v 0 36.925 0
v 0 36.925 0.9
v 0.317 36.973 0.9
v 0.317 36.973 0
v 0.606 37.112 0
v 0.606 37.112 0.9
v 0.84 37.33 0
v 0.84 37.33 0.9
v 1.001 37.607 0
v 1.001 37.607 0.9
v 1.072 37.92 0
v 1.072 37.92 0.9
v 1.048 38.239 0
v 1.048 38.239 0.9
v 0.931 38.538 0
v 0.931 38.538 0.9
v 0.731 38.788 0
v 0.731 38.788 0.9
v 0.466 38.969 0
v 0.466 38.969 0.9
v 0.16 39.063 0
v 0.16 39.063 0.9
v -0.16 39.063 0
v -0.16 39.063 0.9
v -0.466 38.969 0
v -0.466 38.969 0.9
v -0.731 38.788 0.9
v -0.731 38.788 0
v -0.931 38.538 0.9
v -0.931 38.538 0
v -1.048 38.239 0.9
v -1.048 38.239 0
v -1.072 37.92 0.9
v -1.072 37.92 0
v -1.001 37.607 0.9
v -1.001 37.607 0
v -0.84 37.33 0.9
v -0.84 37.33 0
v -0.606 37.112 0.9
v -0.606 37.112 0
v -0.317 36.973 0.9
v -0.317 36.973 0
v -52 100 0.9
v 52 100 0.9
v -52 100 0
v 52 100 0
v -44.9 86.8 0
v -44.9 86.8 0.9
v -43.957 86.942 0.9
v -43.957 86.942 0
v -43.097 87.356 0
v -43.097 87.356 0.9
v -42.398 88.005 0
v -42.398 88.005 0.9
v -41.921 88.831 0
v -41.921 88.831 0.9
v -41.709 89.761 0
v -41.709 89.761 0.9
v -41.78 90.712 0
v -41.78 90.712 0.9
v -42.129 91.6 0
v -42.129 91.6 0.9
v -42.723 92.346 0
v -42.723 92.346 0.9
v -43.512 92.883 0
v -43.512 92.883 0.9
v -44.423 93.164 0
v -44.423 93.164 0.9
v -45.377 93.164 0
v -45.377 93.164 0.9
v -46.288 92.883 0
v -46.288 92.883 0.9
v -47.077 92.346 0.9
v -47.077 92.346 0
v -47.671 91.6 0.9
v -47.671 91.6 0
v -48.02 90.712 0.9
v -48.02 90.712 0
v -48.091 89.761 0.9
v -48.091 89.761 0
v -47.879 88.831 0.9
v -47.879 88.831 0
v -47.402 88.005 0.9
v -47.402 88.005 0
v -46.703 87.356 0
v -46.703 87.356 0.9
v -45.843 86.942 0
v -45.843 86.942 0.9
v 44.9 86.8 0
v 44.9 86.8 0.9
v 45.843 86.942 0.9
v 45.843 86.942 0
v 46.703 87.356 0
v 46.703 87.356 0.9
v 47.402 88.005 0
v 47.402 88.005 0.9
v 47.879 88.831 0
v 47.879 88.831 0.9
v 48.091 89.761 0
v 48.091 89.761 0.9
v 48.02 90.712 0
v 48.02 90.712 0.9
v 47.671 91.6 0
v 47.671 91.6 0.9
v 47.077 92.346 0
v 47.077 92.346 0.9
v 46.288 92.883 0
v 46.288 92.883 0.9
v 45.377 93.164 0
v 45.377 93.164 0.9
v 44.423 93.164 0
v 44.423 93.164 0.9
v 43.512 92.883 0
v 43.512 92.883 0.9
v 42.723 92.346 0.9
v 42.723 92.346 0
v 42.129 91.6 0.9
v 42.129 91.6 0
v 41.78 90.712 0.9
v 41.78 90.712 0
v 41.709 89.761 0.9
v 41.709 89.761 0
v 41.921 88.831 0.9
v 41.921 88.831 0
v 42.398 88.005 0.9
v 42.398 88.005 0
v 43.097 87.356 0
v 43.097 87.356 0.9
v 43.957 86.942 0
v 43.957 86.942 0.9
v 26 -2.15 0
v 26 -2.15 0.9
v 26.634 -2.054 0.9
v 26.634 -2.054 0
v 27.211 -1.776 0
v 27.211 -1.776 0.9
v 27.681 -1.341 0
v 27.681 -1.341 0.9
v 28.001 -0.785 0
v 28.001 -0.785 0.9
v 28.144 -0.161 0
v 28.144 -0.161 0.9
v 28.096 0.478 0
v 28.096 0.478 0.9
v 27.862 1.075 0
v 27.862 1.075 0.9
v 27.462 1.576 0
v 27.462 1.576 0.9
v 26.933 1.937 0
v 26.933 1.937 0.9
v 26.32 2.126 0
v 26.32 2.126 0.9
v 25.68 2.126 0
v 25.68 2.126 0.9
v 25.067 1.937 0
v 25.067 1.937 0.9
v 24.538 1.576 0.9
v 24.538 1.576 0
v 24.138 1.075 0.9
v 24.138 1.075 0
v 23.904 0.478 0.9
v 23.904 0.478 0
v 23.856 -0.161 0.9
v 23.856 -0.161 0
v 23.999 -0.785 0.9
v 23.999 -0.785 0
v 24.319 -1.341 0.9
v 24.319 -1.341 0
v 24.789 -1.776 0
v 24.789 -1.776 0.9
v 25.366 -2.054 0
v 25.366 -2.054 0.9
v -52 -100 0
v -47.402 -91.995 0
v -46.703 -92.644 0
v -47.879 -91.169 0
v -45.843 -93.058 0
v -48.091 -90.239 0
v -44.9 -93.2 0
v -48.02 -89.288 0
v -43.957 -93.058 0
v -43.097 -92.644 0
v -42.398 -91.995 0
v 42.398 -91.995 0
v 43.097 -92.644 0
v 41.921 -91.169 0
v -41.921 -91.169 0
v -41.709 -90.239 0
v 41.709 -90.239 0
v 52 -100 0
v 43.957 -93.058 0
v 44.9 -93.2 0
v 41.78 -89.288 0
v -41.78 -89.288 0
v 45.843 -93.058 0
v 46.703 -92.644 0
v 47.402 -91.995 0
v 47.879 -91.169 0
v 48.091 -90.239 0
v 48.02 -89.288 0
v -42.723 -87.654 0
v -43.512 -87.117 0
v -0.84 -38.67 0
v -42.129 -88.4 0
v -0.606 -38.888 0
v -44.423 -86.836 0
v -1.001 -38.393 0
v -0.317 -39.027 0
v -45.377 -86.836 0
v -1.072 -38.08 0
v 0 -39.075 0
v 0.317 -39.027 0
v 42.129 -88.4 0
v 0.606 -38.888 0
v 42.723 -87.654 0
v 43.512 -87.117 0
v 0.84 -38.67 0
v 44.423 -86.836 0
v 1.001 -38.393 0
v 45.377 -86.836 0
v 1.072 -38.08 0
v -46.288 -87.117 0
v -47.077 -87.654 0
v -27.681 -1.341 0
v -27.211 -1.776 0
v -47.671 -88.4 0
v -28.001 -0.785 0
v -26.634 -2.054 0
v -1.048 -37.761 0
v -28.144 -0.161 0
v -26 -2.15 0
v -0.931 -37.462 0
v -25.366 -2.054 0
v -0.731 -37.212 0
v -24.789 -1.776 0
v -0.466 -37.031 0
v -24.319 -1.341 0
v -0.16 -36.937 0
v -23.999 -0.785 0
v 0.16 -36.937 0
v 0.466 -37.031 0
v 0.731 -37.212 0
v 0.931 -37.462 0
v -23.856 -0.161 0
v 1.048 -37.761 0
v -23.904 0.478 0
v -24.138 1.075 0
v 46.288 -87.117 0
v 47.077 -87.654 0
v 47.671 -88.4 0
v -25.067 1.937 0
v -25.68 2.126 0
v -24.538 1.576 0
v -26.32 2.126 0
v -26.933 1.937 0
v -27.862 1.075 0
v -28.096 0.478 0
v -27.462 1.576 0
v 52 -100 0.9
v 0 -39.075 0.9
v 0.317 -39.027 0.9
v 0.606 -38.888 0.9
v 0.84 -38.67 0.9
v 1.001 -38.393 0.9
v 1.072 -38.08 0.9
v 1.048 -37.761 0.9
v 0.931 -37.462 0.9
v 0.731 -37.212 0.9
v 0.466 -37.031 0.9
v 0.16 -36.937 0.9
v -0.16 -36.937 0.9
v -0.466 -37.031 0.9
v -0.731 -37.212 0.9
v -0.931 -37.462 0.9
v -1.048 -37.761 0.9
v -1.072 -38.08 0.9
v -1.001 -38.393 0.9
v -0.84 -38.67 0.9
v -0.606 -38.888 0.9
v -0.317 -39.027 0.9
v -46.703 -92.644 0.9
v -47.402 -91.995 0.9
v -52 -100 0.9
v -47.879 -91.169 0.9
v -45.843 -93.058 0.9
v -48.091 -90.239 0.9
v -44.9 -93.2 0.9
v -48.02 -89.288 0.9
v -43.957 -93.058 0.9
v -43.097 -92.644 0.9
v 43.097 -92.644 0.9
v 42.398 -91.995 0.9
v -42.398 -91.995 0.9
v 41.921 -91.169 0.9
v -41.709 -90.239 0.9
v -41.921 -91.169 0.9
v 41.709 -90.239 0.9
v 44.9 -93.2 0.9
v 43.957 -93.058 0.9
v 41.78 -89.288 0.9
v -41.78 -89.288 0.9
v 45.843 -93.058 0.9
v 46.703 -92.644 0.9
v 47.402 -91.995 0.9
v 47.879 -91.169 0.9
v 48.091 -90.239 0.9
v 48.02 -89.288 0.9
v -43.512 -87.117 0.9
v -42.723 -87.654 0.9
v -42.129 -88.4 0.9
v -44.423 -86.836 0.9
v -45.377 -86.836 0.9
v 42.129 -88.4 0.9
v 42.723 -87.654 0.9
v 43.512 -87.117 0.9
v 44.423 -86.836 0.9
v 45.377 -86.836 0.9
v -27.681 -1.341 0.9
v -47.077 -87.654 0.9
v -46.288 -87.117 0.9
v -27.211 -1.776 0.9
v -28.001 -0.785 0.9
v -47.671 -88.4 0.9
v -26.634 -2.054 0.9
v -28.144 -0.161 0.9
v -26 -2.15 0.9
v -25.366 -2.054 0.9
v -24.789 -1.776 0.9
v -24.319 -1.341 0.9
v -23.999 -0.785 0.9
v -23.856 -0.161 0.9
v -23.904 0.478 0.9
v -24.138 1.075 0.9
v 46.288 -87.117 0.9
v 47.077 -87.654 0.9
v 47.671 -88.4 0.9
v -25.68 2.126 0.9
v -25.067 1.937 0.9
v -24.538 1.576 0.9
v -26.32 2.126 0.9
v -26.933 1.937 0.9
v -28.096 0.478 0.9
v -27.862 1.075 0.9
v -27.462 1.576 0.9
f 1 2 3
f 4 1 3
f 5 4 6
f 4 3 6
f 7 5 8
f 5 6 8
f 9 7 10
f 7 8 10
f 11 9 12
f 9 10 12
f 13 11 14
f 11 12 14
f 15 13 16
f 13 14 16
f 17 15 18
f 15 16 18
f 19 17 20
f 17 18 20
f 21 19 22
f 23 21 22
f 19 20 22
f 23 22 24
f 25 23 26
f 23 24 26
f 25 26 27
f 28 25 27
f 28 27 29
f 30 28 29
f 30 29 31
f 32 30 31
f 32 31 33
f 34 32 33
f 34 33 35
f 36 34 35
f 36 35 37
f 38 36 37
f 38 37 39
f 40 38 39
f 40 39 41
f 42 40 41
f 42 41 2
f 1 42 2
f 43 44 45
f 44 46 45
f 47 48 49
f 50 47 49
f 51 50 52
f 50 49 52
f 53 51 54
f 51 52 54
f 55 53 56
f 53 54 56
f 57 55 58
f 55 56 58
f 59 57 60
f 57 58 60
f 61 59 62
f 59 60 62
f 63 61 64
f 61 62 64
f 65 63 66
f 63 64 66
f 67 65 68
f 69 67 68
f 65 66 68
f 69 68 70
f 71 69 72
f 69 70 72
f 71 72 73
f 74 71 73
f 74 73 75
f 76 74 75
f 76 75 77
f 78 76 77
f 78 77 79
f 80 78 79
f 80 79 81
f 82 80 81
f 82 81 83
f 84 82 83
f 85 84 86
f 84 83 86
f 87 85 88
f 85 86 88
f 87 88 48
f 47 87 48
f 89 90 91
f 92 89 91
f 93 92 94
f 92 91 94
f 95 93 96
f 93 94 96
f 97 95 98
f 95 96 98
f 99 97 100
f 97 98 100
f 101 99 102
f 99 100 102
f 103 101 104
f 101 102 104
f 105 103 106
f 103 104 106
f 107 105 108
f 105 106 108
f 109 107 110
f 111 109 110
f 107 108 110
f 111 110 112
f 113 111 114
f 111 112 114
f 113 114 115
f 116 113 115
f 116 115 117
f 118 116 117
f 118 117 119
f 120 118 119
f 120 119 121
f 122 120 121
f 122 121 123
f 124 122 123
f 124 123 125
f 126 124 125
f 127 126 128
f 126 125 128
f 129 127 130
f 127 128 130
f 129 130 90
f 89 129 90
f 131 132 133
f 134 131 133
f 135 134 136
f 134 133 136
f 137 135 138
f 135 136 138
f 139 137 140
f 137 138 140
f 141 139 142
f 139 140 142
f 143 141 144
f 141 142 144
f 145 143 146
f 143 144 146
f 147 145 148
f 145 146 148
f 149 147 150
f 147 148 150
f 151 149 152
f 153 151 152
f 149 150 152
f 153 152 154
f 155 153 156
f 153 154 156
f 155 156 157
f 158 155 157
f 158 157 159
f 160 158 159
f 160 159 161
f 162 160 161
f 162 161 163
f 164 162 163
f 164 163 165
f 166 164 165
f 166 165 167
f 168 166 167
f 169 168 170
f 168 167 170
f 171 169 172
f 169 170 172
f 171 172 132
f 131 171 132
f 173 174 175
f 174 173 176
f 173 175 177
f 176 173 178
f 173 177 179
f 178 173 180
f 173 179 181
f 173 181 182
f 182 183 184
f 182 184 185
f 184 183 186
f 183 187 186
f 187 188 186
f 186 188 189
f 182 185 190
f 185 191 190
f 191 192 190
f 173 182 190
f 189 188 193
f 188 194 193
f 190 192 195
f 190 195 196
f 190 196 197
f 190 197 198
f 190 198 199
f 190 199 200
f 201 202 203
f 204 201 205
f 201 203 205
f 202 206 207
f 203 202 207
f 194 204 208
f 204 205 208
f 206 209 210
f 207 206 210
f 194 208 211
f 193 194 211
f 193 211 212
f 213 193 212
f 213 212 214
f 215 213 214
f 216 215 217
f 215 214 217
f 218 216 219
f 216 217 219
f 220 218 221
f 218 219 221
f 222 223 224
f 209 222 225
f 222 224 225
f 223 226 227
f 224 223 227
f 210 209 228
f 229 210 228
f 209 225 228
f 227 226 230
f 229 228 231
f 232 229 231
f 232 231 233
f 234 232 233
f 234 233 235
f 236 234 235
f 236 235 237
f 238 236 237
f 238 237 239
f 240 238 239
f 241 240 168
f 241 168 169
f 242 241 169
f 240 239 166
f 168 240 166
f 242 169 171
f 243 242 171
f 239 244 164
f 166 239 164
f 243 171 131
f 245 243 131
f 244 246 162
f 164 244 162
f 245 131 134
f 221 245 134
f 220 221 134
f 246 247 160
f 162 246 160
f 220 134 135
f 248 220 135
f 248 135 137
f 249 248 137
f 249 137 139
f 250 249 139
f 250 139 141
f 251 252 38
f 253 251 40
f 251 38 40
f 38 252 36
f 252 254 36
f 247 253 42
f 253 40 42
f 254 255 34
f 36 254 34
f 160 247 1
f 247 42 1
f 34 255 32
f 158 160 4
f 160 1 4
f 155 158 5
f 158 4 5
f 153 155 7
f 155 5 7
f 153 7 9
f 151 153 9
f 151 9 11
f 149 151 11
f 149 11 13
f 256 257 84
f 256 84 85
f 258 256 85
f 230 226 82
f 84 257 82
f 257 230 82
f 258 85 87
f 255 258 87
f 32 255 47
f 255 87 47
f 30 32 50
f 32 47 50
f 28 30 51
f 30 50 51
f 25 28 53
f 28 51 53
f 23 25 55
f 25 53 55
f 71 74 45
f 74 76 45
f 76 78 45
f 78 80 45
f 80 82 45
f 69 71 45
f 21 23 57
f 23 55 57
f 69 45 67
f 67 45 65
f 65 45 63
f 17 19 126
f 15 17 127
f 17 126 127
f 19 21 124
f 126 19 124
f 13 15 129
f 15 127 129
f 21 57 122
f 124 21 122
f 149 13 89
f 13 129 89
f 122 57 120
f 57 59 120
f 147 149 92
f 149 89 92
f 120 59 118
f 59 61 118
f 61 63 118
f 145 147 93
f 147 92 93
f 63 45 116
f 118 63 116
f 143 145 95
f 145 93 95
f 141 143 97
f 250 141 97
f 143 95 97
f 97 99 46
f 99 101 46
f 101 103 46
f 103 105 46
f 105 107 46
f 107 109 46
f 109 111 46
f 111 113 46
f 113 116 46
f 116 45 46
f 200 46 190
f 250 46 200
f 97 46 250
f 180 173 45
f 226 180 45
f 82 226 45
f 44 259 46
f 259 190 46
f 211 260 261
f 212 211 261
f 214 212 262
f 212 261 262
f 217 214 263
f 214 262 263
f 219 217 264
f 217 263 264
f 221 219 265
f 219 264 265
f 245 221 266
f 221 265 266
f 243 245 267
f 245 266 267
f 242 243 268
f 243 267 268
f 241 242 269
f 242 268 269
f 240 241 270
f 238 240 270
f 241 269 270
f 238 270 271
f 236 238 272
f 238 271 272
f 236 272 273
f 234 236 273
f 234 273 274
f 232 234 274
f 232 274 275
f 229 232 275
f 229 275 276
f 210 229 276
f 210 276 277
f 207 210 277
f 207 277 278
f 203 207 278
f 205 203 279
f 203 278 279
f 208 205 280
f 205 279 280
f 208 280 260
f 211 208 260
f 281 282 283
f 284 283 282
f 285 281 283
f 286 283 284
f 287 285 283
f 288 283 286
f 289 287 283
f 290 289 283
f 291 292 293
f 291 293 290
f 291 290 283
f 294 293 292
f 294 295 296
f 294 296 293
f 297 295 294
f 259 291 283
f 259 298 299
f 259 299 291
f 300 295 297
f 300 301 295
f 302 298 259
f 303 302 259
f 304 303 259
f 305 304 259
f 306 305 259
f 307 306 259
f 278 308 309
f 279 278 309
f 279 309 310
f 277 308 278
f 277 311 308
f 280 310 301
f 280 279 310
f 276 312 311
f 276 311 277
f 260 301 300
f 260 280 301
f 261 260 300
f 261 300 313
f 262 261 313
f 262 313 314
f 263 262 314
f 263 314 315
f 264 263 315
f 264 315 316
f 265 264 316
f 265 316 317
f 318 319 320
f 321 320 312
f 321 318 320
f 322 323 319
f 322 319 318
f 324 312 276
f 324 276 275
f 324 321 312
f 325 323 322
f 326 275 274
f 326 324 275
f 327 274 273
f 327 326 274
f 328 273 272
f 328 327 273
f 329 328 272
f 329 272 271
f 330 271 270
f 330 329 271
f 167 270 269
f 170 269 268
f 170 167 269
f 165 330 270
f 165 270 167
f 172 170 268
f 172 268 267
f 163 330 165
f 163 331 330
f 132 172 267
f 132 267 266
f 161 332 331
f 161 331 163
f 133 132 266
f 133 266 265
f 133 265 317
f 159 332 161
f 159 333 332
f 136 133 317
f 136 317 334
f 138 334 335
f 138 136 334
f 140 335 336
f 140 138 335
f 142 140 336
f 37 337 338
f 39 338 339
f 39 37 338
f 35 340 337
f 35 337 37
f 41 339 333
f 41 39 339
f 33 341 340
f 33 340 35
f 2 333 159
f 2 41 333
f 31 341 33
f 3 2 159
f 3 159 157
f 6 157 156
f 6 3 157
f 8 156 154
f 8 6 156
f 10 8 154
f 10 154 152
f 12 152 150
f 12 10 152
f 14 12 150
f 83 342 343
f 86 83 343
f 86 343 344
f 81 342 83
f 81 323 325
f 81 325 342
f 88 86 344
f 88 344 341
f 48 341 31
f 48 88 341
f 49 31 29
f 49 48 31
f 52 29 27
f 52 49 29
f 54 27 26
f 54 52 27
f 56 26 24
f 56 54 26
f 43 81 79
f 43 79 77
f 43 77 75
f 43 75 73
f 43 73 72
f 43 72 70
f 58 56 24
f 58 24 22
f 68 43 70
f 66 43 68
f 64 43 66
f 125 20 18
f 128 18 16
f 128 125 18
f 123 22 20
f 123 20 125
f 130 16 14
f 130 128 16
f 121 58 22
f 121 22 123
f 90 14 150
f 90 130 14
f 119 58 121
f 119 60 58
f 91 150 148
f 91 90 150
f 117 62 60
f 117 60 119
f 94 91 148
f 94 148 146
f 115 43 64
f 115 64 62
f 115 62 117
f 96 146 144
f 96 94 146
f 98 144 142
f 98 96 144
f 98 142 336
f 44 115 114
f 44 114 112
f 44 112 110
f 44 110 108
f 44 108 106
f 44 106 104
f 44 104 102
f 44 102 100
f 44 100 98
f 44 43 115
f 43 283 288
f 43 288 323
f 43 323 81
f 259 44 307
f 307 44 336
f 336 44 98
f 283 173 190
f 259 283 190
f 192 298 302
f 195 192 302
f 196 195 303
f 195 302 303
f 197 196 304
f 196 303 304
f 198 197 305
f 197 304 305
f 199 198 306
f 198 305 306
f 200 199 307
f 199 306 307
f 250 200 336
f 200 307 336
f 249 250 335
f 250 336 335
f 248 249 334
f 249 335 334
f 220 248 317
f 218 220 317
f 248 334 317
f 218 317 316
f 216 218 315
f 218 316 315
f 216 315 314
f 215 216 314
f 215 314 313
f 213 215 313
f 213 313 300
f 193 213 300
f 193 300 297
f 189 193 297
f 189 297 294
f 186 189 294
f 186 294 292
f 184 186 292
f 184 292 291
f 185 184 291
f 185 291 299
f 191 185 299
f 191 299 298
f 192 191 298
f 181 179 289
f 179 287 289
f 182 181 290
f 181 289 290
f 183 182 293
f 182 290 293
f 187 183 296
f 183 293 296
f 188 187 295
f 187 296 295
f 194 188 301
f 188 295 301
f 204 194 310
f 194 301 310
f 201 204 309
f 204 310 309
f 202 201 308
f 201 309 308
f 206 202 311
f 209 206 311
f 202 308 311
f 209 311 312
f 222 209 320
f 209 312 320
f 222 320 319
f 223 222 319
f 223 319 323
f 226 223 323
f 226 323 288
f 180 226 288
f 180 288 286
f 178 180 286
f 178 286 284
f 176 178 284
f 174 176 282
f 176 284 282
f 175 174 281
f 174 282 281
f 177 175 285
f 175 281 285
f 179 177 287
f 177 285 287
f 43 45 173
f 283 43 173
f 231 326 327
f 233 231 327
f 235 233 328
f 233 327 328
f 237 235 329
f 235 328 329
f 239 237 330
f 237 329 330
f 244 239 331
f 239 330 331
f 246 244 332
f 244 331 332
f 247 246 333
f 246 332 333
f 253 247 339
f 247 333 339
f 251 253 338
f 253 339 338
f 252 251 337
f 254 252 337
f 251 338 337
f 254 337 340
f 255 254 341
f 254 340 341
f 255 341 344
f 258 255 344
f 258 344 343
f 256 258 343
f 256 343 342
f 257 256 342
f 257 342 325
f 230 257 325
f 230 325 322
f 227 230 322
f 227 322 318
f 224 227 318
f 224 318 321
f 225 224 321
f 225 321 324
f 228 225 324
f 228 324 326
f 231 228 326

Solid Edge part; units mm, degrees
sketch "Sketch1" plane through (0, 0, 0) normal (0, 0, 1) x (1, 0, 0)
  line L0 (-52, -100) -> (52, -100)
  line L1 (52, -100) -> (52, 100)
  line L2 (52, 100) -> (-52, 100)
  line L3 (-52, 100) -> (-52, -100)
extrude "Extrusionsausprägung_1" add sketch "Sketch1" along normal blind 0.9
hole "Bohrung_1" at (-44.9, 90, 0.9) direction (0, 0, -1) diameter 6.4 end up to next
hole "Hole1" at (44.9, 90, 0.9) direction (0, 0, -1) diameter 6.4 end up to next
hole "Hole2" at (44.9, -90, 0.9) direction (0, 0, -1) diameter 6.4 end up to next
hole "Hole3" at (-44.9, -90, 0.9) direction (0, 0, -1) diameter 6.4 end up to next
hole "Bohrung_5" at (-26, 0, 0.9) direction (0, 0, -1) diameter 4.3 end up to next
hole "Hole4" at (26, 0, 0.9) direction (0, 0, -1) diameter 4.3 end up to next
hole "Bohrung_7" at (0, 38, 0.9) direction (0, 0, -1) diameter 2.15 end up to next
hole "Hole5" at (0, -38, 0.9) direction (0, 0, -1) diameter 2.15 end up to next
properties material "Aluminium, 2024-T4"
